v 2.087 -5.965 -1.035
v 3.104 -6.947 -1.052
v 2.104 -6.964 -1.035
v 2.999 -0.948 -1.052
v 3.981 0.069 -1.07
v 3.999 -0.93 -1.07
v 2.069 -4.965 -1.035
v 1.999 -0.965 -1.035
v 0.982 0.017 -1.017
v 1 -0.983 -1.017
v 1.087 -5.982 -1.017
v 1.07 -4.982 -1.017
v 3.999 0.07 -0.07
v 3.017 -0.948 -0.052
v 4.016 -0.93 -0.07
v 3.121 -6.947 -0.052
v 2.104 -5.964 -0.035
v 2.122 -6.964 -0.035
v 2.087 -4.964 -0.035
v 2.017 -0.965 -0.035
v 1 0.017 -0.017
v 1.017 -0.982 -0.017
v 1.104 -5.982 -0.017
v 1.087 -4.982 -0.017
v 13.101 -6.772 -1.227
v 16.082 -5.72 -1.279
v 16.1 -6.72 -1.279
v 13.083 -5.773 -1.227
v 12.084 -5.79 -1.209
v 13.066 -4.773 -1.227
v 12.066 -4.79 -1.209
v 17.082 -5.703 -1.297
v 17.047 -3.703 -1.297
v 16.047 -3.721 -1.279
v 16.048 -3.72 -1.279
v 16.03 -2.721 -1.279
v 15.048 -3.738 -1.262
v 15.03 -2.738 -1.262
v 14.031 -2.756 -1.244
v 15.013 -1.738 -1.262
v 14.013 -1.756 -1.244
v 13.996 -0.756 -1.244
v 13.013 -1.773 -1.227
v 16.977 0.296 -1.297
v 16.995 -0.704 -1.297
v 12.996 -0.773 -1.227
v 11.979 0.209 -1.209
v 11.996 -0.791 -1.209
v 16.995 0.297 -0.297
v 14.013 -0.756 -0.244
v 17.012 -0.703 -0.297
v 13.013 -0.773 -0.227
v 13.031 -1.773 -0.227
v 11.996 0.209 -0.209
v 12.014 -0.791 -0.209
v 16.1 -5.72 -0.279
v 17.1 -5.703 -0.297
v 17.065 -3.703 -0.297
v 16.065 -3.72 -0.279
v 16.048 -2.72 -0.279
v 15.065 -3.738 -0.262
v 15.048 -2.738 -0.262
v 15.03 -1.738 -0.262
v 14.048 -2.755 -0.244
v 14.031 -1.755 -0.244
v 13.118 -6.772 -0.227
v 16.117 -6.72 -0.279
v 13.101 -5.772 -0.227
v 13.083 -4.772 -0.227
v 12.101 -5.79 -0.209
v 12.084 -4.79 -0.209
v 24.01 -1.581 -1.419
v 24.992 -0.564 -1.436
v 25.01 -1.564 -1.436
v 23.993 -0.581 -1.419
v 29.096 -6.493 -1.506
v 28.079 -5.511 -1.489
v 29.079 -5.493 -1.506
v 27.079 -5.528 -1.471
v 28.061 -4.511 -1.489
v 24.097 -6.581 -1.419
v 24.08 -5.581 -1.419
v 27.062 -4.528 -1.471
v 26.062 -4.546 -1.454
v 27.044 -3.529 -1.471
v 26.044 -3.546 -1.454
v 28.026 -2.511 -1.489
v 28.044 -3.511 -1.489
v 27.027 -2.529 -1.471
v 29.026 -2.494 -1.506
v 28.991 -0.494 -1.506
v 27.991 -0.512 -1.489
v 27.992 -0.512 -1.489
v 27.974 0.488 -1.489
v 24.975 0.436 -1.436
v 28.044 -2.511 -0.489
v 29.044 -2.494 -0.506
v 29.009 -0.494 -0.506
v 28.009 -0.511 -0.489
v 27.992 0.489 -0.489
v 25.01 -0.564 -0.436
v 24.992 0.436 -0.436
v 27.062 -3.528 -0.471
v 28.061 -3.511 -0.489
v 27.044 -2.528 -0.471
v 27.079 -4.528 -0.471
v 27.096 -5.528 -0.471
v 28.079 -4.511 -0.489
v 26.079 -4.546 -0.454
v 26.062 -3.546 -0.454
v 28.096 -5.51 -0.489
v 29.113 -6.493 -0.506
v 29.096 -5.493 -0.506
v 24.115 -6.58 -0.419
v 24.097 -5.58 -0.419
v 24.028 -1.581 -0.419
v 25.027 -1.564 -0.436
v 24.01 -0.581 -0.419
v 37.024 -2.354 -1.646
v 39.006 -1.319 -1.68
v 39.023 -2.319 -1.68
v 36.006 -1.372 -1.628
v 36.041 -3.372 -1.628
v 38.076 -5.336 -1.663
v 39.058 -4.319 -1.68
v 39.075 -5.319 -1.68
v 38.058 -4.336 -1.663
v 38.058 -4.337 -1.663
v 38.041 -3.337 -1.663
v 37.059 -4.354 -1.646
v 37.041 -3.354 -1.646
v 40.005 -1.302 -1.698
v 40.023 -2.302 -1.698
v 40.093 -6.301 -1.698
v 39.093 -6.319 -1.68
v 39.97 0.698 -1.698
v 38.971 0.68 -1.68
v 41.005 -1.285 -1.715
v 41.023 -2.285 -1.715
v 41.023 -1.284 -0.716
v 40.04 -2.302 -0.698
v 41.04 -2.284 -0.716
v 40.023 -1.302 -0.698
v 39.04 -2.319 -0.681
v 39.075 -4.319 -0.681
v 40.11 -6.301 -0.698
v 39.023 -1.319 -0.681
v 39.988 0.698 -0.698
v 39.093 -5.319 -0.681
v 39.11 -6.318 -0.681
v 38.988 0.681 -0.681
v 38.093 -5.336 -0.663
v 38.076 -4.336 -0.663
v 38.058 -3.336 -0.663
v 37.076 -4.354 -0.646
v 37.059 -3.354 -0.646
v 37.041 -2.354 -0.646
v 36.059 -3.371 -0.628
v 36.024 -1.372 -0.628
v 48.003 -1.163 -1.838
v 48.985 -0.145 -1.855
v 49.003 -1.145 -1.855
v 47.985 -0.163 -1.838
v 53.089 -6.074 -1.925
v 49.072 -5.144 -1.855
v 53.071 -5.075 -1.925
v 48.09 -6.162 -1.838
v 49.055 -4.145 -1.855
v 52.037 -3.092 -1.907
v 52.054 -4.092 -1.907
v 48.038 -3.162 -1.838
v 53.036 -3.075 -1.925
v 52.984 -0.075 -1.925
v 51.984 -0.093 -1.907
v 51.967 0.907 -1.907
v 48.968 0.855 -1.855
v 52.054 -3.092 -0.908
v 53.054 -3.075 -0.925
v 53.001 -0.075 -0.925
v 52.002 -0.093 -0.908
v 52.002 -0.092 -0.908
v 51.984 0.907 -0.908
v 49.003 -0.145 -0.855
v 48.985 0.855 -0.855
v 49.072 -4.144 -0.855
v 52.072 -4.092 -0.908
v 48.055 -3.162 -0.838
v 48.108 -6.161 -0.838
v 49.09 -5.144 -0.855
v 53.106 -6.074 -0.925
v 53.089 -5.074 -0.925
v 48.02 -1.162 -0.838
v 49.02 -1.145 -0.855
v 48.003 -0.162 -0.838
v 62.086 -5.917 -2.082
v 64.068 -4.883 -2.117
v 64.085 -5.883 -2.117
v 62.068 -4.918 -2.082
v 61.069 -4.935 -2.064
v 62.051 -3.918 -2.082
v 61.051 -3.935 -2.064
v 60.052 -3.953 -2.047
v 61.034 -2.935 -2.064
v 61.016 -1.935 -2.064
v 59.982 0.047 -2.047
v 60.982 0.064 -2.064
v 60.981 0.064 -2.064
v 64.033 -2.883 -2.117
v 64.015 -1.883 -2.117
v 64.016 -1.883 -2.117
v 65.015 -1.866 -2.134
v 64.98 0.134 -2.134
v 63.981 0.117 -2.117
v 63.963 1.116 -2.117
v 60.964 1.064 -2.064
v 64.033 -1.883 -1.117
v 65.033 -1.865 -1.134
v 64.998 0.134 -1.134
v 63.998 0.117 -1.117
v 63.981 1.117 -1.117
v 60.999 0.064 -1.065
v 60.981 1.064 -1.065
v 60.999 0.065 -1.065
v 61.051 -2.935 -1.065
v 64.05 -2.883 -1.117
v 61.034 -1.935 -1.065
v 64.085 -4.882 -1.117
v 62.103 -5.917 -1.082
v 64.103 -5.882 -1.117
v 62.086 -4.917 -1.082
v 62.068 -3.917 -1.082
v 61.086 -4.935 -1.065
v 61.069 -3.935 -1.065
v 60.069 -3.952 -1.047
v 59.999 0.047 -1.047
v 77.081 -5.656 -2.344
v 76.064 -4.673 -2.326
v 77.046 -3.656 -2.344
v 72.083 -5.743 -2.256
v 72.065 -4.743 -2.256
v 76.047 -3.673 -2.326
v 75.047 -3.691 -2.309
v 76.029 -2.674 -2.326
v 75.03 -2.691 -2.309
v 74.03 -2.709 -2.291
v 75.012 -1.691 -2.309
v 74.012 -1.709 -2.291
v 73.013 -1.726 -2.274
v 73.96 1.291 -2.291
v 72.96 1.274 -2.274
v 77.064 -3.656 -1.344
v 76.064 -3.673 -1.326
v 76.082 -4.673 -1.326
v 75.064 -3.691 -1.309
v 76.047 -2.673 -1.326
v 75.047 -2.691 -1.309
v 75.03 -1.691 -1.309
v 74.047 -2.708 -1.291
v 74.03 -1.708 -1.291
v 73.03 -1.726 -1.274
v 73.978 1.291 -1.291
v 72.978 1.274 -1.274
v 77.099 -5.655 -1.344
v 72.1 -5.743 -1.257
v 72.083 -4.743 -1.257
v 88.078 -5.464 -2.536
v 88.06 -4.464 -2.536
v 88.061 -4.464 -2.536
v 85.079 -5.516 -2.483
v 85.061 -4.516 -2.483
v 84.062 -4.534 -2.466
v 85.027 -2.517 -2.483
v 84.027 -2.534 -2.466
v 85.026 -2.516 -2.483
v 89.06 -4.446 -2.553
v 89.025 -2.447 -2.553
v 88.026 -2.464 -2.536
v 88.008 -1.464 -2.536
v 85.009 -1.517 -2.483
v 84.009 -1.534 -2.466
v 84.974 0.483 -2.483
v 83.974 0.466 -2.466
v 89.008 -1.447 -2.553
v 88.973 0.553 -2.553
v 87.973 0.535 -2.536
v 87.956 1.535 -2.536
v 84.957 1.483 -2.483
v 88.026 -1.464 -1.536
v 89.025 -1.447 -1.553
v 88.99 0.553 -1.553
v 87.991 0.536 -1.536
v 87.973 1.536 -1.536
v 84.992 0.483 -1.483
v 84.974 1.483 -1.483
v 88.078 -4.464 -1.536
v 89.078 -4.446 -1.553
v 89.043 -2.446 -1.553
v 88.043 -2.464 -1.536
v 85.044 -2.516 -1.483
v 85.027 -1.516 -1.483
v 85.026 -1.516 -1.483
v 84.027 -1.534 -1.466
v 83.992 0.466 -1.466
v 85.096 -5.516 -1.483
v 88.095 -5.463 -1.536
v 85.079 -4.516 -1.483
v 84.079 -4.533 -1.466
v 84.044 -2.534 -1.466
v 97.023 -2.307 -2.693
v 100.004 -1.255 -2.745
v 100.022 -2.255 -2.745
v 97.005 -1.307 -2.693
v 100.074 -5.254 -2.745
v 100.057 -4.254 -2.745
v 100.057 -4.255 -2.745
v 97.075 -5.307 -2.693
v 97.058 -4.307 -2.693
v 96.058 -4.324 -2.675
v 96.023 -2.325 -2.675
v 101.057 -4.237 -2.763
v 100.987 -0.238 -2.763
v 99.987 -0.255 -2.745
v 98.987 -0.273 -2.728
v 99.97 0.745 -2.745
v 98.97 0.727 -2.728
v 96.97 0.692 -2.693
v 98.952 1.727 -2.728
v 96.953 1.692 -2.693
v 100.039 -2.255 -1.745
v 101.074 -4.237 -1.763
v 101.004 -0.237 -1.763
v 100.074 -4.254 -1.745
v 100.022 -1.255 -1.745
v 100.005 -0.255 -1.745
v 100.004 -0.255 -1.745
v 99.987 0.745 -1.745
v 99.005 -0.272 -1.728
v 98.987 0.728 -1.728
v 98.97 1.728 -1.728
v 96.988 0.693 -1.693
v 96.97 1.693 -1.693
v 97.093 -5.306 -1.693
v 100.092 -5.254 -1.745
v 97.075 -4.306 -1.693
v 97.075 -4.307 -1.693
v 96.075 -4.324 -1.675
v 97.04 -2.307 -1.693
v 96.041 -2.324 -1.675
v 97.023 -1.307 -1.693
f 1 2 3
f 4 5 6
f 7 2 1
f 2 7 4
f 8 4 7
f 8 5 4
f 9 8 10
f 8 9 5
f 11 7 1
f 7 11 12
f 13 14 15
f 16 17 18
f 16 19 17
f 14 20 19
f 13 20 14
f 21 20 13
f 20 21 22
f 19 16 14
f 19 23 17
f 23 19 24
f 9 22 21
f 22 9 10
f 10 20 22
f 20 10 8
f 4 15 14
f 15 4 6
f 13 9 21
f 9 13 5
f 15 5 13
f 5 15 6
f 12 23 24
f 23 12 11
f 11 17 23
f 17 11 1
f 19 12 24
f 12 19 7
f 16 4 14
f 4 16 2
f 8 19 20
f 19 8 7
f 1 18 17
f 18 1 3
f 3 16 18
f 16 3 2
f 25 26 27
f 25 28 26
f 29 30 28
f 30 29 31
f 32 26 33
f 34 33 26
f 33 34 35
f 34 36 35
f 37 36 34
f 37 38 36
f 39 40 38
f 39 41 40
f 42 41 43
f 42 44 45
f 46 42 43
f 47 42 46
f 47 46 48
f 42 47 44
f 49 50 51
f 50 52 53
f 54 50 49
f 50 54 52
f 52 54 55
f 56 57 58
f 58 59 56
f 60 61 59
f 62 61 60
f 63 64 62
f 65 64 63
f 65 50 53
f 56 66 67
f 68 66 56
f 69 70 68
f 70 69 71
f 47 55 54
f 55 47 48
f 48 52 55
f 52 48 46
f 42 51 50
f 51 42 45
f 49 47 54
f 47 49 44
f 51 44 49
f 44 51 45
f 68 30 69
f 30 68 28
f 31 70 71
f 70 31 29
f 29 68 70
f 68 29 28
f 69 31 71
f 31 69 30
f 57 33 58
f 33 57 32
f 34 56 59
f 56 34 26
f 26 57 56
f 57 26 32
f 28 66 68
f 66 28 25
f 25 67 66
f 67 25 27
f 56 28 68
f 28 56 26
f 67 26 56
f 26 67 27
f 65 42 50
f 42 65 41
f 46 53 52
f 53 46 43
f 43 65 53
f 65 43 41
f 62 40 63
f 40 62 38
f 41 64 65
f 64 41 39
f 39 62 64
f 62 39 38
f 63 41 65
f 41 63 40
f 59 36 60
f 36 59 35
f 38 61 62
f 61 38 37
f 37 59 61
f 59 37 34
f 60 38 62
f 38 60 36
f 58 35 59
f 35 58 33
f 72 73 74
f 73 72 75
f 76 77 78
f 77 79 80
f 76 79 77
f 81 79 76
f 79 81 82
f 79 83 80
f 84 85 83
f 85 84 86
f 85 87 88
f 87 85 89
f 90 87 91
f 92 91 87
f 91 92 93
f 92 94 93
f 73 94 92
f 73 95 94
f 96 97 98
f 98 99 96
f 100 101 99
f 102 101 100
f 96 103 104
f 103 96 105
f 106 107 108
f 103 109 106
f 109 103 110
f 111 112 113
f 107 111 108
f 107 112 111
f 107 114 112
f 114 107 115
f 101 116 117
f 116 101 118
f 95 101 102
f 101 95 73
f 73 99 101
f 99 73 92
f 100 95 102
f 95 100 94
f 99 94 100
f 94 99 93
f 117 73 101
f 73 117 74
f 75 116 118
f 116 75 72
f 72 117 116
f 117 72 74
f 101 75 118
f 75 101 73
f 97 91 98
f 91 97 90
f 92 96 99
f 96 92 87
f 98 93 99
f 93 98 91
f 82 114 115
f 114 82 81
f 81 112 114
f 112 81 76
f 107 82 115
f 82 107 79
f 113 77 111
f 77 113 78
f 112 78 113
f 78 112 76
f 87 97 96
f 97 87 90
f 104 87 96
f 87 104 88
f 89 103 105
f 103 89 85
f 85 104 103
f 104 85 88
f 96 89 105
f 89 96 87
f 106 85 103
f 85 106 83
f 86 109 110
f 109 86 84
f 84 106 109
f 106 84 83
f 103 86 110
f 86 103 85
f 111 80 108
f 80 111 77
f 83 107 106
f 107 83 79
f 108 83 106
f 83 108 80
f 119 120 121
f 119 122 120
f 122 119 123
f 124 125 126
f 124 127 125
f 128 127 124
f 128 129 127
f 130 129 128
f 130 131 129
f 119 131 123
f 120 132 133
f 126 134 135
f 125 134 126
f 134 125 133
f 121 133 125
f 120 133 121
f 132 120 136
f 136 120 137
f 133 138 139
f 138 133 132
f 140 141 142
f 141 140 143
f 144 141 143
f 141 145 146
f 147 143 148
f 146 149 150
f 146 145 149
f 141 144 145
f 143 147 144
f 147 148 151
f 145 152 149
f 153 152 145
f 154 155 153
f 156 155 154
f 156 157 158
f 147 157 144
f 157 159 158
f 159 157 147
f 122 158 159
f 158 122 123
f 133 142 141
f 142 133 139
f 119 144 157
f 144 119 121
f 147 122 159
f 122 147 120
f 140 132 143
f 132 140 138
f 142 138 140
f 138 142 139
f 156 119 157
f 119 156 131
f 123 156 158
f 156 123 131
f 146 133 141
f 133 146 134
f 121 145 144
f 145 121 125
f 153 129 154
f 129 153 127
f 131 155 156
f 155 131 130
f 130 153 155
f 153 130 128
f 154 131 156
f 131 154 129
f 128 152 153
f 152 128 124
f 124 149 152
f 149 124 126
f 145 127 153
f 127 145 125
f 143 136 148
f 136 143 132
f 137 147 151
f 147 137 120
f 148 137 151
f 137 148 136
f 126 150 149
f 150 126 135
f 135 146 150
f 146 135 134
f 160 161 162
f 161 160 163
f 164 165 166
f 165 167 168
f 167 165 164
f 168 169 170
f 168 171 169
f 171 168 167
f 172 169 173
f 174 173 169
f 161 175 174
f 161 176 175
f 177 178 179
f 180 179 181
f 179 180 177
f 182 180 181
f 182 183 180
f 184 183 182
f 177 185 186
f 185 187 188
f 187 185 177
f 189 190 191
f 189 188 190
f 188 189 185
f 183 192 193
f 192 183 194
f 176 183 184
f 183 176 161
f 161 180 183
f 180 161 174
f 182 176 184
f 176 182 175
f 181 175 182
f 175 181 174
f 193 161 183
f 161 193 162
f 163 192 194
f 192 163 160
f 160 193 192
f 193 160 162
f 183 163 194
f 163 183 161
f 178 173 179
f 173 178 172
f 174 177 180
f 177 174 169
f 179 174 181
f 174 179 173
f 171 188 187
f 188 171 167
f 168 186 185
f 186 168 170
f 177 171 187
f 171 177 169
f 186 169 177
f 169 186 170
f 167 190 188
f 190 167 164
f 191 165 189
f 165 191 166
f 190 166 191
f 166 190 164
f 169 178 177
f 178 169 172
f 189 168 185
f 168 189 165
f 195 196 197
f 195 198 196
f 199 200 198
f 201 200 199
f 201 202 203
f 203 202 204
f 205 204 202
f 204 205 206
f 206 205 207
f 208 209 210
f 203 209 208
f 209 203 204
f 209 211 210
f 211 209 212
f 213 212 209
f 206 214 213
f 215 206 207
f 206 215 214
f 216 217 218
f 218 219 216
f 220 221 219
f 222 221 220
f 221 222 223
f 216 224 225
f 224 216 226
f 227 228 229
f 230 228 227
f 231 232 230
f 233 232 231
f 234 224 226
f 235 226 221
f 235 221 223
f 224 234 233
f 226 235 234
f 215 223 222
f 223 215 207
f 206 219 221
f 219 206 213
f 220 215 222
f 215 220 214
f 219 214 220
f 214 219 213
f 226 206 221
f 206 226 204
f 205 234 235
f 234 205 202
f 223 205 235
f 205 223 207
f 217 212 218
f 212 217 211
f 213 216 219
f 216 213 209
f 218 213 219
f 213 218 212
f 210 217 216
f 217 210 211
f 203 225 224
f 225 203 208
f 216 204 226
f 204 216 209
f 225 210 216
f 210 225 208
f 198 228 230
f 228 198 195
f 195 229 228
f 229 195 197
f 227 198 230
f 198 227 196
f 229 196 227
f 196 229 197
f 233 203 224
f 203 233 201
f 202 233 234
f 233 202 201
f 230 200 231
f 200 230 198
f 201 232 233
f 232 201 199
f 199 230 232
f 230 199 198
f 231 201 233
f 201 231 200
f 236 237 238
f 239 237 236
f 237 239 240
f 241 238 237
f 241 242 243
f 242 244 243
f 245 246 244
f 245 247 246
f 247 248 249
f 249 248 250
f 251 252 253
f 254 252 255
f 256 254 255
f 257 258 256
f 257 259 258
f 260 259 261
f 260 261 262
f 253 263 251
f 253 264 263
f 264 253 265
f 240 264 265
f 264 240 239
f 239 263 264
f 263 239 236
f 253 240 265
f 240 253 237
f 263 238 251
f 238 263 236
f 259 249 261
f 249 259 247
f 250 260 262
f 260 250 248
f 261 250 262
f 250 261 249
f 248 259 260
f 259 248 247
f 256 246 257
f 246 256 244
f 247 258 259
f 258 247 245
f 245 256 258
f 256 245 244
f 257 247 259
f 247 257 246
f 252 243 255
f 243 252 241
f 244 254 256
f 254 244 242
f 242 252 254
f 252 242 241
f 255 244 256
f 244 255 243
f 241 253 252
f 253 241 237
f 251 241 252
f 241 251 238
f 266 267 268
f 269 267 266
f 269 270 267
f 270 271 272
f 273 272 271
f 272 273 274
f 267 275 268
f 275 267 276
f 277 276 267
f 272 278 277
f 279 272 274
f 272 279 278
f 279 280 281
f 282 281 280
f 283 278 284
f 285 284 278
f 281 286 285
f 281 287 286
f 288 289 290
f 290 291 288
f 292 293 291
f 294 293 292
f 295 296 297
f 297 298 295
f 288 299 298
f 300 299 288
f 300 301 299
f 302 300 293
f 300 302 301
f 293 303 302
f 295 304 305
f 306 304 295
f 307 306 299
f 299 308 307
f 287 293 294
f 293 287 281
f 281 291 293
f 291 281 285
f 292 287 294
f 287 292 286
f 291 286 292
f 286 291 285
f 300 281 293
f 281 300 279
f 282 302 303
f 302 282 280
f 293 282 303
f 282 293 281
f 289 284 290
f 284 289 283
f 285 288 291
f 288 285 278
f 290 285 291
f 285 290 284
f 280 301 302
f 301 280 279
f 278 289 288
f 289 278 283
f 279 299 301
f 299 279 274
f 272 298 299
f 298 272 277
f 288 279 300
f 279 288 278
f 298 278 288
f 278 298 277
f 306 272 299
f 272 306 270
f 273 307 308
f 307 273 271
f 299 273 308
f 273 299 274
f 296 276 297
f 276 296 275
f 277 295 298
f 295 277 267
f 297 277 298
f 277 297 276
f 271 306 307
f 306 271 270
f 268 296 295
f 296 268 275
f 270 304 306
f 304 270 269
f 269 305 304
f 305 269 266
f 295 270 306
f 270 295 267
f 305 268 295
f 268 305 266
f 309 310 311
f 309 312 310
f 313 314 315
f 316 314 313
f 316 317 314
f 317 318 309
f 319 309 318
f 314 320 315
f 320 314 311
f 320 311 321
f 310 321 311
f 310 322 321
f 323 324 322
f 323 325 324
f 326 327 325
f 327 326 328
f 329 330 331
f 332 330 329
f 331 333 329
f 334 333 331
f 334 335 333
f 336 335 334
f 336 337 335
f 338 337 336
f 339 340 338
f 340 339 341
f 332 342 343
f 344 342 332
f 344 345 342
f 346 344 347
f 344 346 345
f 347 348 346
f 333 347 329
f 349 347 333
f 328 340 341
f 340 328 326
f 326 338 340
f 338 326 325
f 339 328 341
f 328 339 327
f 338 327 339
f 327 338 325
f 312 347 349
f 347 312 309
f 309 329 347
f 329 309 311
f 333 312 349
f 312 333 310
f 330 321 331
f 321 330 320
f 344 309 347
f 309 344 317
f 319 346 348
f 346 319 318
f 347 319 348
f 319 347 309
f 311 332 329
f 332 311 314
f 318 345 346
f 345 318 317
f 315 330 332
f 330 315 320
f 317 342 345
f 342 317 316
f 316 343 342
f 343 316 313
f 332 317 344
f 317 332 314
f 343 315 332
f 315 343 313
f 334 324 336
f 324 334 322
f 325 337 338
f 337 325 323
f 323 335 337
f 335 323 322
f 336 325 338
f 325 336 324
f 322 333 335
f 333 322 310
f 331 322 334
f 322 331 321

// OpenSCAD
// file: TextGenerator.scad
//Draw text
scale([4,4,4]) drawtext("Hello World!");

//Draw character set
//scale([2,2,2]) drawtext(" !\"#$%&'()*+,-./0123456789:;<=>?@ABCDEFGHIJKLMNOPQRSTUVWXYZ[\\]^_`abcdefghijklmnopqrstuvwxyz{|}");

module drawtext(text,center=false) {
	//Characters
	chars = " !\"#$%&'()*+,-./0123456789:;<=>?@ABCDEFGHIJKLMNOPQRSTUVWXYZ[\\]^_`abcdefghijklmnopqrstuvwxyz{|}";

	//Chracter table defining 5x7 characters
	//Adapted from: http://www.geocities.com/dinceraydin/djlcdsim/chartable.js
	char_table = [ [ 0, 0, 0, 0, 0, 0, 0],
                  [ 4, 0, 4, 4, 4, 4, 4],
                  [ 0, 0, 0, 0,10,10,10],
                  [10,10,31,10,31,10,10],
                  [ 4,30, 5,14,20,15, 4],
                  [ 3,19, 8, 4, 2,25,24],
                  [13,18,21, 8,20,18,12],
                  [ 0, 0, 0, 0, 8, 4,12],
                  [ 2, 4, 8, 8, 8, 4, 2],
                  [ 8, 4, 2, 2, 2, 4, 8],
                  [ 0, 4,21,14,21, 4, 0],
                  [ 0, 4, 4,31, 4, 4, 0],
                  [ 8, 4,12, 0, 0, 0, 0],
                  [ 0, 0, 0,31, 0, 0, 0],
                  [12,12, 0, 0, 0, 0, 0],
                  [ 0,16, 8, 4, 2, 1, 0],
                  [14,17,25,21,19,17,14],
                  [14, 4, 4, 4, 4,12, 4],
                  [31, 8, 4, 2, 1,17,14],
                  [14,17, 1, 2, 4, 2,31],
                  [ 2, 2,31,18,10, 6, 2],
                  [14,17, 1, 1,30,16,31],
                  [14,17,17,30,16, 8, 6],
                  [ 8, 8, 8, 4, 2, 1,31],
                  [14,17,17,14,17,17,14],
                  [12, 2, 1,15,17,17,14],
                  [ 0,12,12, 0,12,12, 0],
                  [ 8, 4,12, 0,12,12, 0],
                  [ 2, 4, 8,16, 8, 4, 2],
                  [ 0, 0,31, 0,31, 0, 0],
                  [16, 8, 4, 2, 4, 8,16],
                  [ 4, 0, 4, 2, 1,17,14],
                  [14,21,21,13, 1,17,14],
                  [17,17,31,17,17,17,14],
                  [30,17,17,30,17,17,30],
                  [14,17,16,16,16,17,14],
                  [30,17,17,17,17,17,30],
                  [31,16,16,30,16,16,31],
                  [16,16,16,30,16,16,31],
                  [15,17,17,23,16,17,14],
                  [17,17,17,31,17,17,17],
                  [14, 4, 4, 4, 4, 4,14],
                  [12,18, 2, 2, 2, 2, 7],
                  [17,18,20,24,20,18,17],
                  [31,16,16,16,16,16,16],
                  [17,17,17,21,21,27,17],
                  [17,17,19,21,25,17,17],
                  [14,17,17,17,17,17,14],
                  [16,16,16,30,17,17,30],
                  [13,18,21,17,17,17,14],
                  [17,18,20,30,17,17,30],
                  [30, 1, 1,14,16,16,15],
                  [ 4, 4, 4, 4, 4, 4,31],
                  [14,17,17,17,17,17,17],
                  [ 4,10,17,17,17,17,17],
                  [10,21,21,21,17,17,17],
                  [17,17,10, 4,10,17,17],
                  [ 4, 4, 4,10,17,17,17],
                  [31,16, 8, 4, 2, 1,31],
                  [14, 8, 8, 8, 8, 8,14],
                  [ 0, 1, 2, 4, 8,16, 0],
                  [14, 2, 2, 2, 2, 2,14],
                  [ 0, 0, 0, 0,17,10, 4],
                  [31, 0, 0, 0, 0, 0, 0],
                  [ 0, 0, 0, 0, 2, 4, 8],
                  [15,17,15, 1,14, 0, 0],
                  [30,17,17,25,22,16,16],
                  [14,17,16,16,14, 0, 0],
                  [15,17,17,19,13, 1, 1],
                  [14,16,31,17,14, 0, 0],
                  [ 8, 8, 8,28, 8, 9, 6],
                  [14, 1,15,17,15, 0, 0],
                  [17,17,17,25,22,16,16],
                  [14, 4, 4, 4,12, 0, 4],
                  [12,18, 2, 2, 2, 6, 2],
                  [18,20,24,20,18,16,16],
                  [14, 4, 4, 4, 4, 4,12],
                  [17,17,21,21,26, 0, 0],
                  [17,17,17,25,22, 0, 0],
                  [14,17,17,17,14, 0, 0],
                  [16,16,30,17,30, 0, 0],
                  [ 1, 1,15,19,13, 0, 0],
                  [16,16,16,25,22, 0, 0],
                  [30, 1,14,16,15, 0, 0],
                  [ 6, 9, 8, 8,28, 8, 8],
                  [13,19,17,17,17, 0, 0],
                  [ 4,10,17,17,17, 0, 0],
                  [10,21,21,17,17, 0, 0],
                  [17,10, 4,10,17, 0, 0],
                  [14, 1,15,17,17, 0, 0],
                  [31, 8, 4, 2,31, 0, 0],
                  [ 2, 4, 4, 8, 4, 4, 2],
                  [ 4, 4, 4, 4, 4, 4, 4],
                  [ 8, 4, 4, 2, 4, 4, 8] ];

	//Binary decode table
	dec_table = [ "00000", "00001", "00010", "00011", "00100", "00101",
  	            "00110", "00111", "01000", "01001", "01010", "01011",
  	            "01100", "01101", "01110", "01111", "10000", "10001",
  	            "10010", "10011", "10100", "10101", "10110", "10111",
	            "11000", "11001", "11010", "11011", "11100", "11101",
	            "11110", "11111" ];

    //Process string one character at a time
    for(itext = [0:len(text)-1]) {
        assign(length = len(text)) {
            //Convert character to index
            assign(ichar = search(text[itext],chars,1)[0]) {
                //Decode character - rows
                for(irow = [0:6]) {
                    assign(val = dec_table[char_table[ichar][irow]]) {
                        //Decode character - cols
                        for(icol = [0:4]) {
                            assign(bit = search(val[icol],"01",1)[0]) {
                                if(bit) {
                                    //Output cube
                                    if (center)
                                        translate([icol - 2.5 +
                                        (6*itext)-len(text)/2, irow-3.5,0])
                                            cube([1.0001,1.0001,1]);
                                    else {
                                        translate([icol + (6*itext), irow, 0])
                                            cube([1.0001,1.0001,1]);
                                    }
                                }
                            }
                        }
                    }
                }
            }
	}
}
}
// main file
use <TextGenerator.scad>
//scale([4,4,4])
rotate([180, 1, 1]) {drawtext("1 2 3 4 5 6 7 8 9");}
